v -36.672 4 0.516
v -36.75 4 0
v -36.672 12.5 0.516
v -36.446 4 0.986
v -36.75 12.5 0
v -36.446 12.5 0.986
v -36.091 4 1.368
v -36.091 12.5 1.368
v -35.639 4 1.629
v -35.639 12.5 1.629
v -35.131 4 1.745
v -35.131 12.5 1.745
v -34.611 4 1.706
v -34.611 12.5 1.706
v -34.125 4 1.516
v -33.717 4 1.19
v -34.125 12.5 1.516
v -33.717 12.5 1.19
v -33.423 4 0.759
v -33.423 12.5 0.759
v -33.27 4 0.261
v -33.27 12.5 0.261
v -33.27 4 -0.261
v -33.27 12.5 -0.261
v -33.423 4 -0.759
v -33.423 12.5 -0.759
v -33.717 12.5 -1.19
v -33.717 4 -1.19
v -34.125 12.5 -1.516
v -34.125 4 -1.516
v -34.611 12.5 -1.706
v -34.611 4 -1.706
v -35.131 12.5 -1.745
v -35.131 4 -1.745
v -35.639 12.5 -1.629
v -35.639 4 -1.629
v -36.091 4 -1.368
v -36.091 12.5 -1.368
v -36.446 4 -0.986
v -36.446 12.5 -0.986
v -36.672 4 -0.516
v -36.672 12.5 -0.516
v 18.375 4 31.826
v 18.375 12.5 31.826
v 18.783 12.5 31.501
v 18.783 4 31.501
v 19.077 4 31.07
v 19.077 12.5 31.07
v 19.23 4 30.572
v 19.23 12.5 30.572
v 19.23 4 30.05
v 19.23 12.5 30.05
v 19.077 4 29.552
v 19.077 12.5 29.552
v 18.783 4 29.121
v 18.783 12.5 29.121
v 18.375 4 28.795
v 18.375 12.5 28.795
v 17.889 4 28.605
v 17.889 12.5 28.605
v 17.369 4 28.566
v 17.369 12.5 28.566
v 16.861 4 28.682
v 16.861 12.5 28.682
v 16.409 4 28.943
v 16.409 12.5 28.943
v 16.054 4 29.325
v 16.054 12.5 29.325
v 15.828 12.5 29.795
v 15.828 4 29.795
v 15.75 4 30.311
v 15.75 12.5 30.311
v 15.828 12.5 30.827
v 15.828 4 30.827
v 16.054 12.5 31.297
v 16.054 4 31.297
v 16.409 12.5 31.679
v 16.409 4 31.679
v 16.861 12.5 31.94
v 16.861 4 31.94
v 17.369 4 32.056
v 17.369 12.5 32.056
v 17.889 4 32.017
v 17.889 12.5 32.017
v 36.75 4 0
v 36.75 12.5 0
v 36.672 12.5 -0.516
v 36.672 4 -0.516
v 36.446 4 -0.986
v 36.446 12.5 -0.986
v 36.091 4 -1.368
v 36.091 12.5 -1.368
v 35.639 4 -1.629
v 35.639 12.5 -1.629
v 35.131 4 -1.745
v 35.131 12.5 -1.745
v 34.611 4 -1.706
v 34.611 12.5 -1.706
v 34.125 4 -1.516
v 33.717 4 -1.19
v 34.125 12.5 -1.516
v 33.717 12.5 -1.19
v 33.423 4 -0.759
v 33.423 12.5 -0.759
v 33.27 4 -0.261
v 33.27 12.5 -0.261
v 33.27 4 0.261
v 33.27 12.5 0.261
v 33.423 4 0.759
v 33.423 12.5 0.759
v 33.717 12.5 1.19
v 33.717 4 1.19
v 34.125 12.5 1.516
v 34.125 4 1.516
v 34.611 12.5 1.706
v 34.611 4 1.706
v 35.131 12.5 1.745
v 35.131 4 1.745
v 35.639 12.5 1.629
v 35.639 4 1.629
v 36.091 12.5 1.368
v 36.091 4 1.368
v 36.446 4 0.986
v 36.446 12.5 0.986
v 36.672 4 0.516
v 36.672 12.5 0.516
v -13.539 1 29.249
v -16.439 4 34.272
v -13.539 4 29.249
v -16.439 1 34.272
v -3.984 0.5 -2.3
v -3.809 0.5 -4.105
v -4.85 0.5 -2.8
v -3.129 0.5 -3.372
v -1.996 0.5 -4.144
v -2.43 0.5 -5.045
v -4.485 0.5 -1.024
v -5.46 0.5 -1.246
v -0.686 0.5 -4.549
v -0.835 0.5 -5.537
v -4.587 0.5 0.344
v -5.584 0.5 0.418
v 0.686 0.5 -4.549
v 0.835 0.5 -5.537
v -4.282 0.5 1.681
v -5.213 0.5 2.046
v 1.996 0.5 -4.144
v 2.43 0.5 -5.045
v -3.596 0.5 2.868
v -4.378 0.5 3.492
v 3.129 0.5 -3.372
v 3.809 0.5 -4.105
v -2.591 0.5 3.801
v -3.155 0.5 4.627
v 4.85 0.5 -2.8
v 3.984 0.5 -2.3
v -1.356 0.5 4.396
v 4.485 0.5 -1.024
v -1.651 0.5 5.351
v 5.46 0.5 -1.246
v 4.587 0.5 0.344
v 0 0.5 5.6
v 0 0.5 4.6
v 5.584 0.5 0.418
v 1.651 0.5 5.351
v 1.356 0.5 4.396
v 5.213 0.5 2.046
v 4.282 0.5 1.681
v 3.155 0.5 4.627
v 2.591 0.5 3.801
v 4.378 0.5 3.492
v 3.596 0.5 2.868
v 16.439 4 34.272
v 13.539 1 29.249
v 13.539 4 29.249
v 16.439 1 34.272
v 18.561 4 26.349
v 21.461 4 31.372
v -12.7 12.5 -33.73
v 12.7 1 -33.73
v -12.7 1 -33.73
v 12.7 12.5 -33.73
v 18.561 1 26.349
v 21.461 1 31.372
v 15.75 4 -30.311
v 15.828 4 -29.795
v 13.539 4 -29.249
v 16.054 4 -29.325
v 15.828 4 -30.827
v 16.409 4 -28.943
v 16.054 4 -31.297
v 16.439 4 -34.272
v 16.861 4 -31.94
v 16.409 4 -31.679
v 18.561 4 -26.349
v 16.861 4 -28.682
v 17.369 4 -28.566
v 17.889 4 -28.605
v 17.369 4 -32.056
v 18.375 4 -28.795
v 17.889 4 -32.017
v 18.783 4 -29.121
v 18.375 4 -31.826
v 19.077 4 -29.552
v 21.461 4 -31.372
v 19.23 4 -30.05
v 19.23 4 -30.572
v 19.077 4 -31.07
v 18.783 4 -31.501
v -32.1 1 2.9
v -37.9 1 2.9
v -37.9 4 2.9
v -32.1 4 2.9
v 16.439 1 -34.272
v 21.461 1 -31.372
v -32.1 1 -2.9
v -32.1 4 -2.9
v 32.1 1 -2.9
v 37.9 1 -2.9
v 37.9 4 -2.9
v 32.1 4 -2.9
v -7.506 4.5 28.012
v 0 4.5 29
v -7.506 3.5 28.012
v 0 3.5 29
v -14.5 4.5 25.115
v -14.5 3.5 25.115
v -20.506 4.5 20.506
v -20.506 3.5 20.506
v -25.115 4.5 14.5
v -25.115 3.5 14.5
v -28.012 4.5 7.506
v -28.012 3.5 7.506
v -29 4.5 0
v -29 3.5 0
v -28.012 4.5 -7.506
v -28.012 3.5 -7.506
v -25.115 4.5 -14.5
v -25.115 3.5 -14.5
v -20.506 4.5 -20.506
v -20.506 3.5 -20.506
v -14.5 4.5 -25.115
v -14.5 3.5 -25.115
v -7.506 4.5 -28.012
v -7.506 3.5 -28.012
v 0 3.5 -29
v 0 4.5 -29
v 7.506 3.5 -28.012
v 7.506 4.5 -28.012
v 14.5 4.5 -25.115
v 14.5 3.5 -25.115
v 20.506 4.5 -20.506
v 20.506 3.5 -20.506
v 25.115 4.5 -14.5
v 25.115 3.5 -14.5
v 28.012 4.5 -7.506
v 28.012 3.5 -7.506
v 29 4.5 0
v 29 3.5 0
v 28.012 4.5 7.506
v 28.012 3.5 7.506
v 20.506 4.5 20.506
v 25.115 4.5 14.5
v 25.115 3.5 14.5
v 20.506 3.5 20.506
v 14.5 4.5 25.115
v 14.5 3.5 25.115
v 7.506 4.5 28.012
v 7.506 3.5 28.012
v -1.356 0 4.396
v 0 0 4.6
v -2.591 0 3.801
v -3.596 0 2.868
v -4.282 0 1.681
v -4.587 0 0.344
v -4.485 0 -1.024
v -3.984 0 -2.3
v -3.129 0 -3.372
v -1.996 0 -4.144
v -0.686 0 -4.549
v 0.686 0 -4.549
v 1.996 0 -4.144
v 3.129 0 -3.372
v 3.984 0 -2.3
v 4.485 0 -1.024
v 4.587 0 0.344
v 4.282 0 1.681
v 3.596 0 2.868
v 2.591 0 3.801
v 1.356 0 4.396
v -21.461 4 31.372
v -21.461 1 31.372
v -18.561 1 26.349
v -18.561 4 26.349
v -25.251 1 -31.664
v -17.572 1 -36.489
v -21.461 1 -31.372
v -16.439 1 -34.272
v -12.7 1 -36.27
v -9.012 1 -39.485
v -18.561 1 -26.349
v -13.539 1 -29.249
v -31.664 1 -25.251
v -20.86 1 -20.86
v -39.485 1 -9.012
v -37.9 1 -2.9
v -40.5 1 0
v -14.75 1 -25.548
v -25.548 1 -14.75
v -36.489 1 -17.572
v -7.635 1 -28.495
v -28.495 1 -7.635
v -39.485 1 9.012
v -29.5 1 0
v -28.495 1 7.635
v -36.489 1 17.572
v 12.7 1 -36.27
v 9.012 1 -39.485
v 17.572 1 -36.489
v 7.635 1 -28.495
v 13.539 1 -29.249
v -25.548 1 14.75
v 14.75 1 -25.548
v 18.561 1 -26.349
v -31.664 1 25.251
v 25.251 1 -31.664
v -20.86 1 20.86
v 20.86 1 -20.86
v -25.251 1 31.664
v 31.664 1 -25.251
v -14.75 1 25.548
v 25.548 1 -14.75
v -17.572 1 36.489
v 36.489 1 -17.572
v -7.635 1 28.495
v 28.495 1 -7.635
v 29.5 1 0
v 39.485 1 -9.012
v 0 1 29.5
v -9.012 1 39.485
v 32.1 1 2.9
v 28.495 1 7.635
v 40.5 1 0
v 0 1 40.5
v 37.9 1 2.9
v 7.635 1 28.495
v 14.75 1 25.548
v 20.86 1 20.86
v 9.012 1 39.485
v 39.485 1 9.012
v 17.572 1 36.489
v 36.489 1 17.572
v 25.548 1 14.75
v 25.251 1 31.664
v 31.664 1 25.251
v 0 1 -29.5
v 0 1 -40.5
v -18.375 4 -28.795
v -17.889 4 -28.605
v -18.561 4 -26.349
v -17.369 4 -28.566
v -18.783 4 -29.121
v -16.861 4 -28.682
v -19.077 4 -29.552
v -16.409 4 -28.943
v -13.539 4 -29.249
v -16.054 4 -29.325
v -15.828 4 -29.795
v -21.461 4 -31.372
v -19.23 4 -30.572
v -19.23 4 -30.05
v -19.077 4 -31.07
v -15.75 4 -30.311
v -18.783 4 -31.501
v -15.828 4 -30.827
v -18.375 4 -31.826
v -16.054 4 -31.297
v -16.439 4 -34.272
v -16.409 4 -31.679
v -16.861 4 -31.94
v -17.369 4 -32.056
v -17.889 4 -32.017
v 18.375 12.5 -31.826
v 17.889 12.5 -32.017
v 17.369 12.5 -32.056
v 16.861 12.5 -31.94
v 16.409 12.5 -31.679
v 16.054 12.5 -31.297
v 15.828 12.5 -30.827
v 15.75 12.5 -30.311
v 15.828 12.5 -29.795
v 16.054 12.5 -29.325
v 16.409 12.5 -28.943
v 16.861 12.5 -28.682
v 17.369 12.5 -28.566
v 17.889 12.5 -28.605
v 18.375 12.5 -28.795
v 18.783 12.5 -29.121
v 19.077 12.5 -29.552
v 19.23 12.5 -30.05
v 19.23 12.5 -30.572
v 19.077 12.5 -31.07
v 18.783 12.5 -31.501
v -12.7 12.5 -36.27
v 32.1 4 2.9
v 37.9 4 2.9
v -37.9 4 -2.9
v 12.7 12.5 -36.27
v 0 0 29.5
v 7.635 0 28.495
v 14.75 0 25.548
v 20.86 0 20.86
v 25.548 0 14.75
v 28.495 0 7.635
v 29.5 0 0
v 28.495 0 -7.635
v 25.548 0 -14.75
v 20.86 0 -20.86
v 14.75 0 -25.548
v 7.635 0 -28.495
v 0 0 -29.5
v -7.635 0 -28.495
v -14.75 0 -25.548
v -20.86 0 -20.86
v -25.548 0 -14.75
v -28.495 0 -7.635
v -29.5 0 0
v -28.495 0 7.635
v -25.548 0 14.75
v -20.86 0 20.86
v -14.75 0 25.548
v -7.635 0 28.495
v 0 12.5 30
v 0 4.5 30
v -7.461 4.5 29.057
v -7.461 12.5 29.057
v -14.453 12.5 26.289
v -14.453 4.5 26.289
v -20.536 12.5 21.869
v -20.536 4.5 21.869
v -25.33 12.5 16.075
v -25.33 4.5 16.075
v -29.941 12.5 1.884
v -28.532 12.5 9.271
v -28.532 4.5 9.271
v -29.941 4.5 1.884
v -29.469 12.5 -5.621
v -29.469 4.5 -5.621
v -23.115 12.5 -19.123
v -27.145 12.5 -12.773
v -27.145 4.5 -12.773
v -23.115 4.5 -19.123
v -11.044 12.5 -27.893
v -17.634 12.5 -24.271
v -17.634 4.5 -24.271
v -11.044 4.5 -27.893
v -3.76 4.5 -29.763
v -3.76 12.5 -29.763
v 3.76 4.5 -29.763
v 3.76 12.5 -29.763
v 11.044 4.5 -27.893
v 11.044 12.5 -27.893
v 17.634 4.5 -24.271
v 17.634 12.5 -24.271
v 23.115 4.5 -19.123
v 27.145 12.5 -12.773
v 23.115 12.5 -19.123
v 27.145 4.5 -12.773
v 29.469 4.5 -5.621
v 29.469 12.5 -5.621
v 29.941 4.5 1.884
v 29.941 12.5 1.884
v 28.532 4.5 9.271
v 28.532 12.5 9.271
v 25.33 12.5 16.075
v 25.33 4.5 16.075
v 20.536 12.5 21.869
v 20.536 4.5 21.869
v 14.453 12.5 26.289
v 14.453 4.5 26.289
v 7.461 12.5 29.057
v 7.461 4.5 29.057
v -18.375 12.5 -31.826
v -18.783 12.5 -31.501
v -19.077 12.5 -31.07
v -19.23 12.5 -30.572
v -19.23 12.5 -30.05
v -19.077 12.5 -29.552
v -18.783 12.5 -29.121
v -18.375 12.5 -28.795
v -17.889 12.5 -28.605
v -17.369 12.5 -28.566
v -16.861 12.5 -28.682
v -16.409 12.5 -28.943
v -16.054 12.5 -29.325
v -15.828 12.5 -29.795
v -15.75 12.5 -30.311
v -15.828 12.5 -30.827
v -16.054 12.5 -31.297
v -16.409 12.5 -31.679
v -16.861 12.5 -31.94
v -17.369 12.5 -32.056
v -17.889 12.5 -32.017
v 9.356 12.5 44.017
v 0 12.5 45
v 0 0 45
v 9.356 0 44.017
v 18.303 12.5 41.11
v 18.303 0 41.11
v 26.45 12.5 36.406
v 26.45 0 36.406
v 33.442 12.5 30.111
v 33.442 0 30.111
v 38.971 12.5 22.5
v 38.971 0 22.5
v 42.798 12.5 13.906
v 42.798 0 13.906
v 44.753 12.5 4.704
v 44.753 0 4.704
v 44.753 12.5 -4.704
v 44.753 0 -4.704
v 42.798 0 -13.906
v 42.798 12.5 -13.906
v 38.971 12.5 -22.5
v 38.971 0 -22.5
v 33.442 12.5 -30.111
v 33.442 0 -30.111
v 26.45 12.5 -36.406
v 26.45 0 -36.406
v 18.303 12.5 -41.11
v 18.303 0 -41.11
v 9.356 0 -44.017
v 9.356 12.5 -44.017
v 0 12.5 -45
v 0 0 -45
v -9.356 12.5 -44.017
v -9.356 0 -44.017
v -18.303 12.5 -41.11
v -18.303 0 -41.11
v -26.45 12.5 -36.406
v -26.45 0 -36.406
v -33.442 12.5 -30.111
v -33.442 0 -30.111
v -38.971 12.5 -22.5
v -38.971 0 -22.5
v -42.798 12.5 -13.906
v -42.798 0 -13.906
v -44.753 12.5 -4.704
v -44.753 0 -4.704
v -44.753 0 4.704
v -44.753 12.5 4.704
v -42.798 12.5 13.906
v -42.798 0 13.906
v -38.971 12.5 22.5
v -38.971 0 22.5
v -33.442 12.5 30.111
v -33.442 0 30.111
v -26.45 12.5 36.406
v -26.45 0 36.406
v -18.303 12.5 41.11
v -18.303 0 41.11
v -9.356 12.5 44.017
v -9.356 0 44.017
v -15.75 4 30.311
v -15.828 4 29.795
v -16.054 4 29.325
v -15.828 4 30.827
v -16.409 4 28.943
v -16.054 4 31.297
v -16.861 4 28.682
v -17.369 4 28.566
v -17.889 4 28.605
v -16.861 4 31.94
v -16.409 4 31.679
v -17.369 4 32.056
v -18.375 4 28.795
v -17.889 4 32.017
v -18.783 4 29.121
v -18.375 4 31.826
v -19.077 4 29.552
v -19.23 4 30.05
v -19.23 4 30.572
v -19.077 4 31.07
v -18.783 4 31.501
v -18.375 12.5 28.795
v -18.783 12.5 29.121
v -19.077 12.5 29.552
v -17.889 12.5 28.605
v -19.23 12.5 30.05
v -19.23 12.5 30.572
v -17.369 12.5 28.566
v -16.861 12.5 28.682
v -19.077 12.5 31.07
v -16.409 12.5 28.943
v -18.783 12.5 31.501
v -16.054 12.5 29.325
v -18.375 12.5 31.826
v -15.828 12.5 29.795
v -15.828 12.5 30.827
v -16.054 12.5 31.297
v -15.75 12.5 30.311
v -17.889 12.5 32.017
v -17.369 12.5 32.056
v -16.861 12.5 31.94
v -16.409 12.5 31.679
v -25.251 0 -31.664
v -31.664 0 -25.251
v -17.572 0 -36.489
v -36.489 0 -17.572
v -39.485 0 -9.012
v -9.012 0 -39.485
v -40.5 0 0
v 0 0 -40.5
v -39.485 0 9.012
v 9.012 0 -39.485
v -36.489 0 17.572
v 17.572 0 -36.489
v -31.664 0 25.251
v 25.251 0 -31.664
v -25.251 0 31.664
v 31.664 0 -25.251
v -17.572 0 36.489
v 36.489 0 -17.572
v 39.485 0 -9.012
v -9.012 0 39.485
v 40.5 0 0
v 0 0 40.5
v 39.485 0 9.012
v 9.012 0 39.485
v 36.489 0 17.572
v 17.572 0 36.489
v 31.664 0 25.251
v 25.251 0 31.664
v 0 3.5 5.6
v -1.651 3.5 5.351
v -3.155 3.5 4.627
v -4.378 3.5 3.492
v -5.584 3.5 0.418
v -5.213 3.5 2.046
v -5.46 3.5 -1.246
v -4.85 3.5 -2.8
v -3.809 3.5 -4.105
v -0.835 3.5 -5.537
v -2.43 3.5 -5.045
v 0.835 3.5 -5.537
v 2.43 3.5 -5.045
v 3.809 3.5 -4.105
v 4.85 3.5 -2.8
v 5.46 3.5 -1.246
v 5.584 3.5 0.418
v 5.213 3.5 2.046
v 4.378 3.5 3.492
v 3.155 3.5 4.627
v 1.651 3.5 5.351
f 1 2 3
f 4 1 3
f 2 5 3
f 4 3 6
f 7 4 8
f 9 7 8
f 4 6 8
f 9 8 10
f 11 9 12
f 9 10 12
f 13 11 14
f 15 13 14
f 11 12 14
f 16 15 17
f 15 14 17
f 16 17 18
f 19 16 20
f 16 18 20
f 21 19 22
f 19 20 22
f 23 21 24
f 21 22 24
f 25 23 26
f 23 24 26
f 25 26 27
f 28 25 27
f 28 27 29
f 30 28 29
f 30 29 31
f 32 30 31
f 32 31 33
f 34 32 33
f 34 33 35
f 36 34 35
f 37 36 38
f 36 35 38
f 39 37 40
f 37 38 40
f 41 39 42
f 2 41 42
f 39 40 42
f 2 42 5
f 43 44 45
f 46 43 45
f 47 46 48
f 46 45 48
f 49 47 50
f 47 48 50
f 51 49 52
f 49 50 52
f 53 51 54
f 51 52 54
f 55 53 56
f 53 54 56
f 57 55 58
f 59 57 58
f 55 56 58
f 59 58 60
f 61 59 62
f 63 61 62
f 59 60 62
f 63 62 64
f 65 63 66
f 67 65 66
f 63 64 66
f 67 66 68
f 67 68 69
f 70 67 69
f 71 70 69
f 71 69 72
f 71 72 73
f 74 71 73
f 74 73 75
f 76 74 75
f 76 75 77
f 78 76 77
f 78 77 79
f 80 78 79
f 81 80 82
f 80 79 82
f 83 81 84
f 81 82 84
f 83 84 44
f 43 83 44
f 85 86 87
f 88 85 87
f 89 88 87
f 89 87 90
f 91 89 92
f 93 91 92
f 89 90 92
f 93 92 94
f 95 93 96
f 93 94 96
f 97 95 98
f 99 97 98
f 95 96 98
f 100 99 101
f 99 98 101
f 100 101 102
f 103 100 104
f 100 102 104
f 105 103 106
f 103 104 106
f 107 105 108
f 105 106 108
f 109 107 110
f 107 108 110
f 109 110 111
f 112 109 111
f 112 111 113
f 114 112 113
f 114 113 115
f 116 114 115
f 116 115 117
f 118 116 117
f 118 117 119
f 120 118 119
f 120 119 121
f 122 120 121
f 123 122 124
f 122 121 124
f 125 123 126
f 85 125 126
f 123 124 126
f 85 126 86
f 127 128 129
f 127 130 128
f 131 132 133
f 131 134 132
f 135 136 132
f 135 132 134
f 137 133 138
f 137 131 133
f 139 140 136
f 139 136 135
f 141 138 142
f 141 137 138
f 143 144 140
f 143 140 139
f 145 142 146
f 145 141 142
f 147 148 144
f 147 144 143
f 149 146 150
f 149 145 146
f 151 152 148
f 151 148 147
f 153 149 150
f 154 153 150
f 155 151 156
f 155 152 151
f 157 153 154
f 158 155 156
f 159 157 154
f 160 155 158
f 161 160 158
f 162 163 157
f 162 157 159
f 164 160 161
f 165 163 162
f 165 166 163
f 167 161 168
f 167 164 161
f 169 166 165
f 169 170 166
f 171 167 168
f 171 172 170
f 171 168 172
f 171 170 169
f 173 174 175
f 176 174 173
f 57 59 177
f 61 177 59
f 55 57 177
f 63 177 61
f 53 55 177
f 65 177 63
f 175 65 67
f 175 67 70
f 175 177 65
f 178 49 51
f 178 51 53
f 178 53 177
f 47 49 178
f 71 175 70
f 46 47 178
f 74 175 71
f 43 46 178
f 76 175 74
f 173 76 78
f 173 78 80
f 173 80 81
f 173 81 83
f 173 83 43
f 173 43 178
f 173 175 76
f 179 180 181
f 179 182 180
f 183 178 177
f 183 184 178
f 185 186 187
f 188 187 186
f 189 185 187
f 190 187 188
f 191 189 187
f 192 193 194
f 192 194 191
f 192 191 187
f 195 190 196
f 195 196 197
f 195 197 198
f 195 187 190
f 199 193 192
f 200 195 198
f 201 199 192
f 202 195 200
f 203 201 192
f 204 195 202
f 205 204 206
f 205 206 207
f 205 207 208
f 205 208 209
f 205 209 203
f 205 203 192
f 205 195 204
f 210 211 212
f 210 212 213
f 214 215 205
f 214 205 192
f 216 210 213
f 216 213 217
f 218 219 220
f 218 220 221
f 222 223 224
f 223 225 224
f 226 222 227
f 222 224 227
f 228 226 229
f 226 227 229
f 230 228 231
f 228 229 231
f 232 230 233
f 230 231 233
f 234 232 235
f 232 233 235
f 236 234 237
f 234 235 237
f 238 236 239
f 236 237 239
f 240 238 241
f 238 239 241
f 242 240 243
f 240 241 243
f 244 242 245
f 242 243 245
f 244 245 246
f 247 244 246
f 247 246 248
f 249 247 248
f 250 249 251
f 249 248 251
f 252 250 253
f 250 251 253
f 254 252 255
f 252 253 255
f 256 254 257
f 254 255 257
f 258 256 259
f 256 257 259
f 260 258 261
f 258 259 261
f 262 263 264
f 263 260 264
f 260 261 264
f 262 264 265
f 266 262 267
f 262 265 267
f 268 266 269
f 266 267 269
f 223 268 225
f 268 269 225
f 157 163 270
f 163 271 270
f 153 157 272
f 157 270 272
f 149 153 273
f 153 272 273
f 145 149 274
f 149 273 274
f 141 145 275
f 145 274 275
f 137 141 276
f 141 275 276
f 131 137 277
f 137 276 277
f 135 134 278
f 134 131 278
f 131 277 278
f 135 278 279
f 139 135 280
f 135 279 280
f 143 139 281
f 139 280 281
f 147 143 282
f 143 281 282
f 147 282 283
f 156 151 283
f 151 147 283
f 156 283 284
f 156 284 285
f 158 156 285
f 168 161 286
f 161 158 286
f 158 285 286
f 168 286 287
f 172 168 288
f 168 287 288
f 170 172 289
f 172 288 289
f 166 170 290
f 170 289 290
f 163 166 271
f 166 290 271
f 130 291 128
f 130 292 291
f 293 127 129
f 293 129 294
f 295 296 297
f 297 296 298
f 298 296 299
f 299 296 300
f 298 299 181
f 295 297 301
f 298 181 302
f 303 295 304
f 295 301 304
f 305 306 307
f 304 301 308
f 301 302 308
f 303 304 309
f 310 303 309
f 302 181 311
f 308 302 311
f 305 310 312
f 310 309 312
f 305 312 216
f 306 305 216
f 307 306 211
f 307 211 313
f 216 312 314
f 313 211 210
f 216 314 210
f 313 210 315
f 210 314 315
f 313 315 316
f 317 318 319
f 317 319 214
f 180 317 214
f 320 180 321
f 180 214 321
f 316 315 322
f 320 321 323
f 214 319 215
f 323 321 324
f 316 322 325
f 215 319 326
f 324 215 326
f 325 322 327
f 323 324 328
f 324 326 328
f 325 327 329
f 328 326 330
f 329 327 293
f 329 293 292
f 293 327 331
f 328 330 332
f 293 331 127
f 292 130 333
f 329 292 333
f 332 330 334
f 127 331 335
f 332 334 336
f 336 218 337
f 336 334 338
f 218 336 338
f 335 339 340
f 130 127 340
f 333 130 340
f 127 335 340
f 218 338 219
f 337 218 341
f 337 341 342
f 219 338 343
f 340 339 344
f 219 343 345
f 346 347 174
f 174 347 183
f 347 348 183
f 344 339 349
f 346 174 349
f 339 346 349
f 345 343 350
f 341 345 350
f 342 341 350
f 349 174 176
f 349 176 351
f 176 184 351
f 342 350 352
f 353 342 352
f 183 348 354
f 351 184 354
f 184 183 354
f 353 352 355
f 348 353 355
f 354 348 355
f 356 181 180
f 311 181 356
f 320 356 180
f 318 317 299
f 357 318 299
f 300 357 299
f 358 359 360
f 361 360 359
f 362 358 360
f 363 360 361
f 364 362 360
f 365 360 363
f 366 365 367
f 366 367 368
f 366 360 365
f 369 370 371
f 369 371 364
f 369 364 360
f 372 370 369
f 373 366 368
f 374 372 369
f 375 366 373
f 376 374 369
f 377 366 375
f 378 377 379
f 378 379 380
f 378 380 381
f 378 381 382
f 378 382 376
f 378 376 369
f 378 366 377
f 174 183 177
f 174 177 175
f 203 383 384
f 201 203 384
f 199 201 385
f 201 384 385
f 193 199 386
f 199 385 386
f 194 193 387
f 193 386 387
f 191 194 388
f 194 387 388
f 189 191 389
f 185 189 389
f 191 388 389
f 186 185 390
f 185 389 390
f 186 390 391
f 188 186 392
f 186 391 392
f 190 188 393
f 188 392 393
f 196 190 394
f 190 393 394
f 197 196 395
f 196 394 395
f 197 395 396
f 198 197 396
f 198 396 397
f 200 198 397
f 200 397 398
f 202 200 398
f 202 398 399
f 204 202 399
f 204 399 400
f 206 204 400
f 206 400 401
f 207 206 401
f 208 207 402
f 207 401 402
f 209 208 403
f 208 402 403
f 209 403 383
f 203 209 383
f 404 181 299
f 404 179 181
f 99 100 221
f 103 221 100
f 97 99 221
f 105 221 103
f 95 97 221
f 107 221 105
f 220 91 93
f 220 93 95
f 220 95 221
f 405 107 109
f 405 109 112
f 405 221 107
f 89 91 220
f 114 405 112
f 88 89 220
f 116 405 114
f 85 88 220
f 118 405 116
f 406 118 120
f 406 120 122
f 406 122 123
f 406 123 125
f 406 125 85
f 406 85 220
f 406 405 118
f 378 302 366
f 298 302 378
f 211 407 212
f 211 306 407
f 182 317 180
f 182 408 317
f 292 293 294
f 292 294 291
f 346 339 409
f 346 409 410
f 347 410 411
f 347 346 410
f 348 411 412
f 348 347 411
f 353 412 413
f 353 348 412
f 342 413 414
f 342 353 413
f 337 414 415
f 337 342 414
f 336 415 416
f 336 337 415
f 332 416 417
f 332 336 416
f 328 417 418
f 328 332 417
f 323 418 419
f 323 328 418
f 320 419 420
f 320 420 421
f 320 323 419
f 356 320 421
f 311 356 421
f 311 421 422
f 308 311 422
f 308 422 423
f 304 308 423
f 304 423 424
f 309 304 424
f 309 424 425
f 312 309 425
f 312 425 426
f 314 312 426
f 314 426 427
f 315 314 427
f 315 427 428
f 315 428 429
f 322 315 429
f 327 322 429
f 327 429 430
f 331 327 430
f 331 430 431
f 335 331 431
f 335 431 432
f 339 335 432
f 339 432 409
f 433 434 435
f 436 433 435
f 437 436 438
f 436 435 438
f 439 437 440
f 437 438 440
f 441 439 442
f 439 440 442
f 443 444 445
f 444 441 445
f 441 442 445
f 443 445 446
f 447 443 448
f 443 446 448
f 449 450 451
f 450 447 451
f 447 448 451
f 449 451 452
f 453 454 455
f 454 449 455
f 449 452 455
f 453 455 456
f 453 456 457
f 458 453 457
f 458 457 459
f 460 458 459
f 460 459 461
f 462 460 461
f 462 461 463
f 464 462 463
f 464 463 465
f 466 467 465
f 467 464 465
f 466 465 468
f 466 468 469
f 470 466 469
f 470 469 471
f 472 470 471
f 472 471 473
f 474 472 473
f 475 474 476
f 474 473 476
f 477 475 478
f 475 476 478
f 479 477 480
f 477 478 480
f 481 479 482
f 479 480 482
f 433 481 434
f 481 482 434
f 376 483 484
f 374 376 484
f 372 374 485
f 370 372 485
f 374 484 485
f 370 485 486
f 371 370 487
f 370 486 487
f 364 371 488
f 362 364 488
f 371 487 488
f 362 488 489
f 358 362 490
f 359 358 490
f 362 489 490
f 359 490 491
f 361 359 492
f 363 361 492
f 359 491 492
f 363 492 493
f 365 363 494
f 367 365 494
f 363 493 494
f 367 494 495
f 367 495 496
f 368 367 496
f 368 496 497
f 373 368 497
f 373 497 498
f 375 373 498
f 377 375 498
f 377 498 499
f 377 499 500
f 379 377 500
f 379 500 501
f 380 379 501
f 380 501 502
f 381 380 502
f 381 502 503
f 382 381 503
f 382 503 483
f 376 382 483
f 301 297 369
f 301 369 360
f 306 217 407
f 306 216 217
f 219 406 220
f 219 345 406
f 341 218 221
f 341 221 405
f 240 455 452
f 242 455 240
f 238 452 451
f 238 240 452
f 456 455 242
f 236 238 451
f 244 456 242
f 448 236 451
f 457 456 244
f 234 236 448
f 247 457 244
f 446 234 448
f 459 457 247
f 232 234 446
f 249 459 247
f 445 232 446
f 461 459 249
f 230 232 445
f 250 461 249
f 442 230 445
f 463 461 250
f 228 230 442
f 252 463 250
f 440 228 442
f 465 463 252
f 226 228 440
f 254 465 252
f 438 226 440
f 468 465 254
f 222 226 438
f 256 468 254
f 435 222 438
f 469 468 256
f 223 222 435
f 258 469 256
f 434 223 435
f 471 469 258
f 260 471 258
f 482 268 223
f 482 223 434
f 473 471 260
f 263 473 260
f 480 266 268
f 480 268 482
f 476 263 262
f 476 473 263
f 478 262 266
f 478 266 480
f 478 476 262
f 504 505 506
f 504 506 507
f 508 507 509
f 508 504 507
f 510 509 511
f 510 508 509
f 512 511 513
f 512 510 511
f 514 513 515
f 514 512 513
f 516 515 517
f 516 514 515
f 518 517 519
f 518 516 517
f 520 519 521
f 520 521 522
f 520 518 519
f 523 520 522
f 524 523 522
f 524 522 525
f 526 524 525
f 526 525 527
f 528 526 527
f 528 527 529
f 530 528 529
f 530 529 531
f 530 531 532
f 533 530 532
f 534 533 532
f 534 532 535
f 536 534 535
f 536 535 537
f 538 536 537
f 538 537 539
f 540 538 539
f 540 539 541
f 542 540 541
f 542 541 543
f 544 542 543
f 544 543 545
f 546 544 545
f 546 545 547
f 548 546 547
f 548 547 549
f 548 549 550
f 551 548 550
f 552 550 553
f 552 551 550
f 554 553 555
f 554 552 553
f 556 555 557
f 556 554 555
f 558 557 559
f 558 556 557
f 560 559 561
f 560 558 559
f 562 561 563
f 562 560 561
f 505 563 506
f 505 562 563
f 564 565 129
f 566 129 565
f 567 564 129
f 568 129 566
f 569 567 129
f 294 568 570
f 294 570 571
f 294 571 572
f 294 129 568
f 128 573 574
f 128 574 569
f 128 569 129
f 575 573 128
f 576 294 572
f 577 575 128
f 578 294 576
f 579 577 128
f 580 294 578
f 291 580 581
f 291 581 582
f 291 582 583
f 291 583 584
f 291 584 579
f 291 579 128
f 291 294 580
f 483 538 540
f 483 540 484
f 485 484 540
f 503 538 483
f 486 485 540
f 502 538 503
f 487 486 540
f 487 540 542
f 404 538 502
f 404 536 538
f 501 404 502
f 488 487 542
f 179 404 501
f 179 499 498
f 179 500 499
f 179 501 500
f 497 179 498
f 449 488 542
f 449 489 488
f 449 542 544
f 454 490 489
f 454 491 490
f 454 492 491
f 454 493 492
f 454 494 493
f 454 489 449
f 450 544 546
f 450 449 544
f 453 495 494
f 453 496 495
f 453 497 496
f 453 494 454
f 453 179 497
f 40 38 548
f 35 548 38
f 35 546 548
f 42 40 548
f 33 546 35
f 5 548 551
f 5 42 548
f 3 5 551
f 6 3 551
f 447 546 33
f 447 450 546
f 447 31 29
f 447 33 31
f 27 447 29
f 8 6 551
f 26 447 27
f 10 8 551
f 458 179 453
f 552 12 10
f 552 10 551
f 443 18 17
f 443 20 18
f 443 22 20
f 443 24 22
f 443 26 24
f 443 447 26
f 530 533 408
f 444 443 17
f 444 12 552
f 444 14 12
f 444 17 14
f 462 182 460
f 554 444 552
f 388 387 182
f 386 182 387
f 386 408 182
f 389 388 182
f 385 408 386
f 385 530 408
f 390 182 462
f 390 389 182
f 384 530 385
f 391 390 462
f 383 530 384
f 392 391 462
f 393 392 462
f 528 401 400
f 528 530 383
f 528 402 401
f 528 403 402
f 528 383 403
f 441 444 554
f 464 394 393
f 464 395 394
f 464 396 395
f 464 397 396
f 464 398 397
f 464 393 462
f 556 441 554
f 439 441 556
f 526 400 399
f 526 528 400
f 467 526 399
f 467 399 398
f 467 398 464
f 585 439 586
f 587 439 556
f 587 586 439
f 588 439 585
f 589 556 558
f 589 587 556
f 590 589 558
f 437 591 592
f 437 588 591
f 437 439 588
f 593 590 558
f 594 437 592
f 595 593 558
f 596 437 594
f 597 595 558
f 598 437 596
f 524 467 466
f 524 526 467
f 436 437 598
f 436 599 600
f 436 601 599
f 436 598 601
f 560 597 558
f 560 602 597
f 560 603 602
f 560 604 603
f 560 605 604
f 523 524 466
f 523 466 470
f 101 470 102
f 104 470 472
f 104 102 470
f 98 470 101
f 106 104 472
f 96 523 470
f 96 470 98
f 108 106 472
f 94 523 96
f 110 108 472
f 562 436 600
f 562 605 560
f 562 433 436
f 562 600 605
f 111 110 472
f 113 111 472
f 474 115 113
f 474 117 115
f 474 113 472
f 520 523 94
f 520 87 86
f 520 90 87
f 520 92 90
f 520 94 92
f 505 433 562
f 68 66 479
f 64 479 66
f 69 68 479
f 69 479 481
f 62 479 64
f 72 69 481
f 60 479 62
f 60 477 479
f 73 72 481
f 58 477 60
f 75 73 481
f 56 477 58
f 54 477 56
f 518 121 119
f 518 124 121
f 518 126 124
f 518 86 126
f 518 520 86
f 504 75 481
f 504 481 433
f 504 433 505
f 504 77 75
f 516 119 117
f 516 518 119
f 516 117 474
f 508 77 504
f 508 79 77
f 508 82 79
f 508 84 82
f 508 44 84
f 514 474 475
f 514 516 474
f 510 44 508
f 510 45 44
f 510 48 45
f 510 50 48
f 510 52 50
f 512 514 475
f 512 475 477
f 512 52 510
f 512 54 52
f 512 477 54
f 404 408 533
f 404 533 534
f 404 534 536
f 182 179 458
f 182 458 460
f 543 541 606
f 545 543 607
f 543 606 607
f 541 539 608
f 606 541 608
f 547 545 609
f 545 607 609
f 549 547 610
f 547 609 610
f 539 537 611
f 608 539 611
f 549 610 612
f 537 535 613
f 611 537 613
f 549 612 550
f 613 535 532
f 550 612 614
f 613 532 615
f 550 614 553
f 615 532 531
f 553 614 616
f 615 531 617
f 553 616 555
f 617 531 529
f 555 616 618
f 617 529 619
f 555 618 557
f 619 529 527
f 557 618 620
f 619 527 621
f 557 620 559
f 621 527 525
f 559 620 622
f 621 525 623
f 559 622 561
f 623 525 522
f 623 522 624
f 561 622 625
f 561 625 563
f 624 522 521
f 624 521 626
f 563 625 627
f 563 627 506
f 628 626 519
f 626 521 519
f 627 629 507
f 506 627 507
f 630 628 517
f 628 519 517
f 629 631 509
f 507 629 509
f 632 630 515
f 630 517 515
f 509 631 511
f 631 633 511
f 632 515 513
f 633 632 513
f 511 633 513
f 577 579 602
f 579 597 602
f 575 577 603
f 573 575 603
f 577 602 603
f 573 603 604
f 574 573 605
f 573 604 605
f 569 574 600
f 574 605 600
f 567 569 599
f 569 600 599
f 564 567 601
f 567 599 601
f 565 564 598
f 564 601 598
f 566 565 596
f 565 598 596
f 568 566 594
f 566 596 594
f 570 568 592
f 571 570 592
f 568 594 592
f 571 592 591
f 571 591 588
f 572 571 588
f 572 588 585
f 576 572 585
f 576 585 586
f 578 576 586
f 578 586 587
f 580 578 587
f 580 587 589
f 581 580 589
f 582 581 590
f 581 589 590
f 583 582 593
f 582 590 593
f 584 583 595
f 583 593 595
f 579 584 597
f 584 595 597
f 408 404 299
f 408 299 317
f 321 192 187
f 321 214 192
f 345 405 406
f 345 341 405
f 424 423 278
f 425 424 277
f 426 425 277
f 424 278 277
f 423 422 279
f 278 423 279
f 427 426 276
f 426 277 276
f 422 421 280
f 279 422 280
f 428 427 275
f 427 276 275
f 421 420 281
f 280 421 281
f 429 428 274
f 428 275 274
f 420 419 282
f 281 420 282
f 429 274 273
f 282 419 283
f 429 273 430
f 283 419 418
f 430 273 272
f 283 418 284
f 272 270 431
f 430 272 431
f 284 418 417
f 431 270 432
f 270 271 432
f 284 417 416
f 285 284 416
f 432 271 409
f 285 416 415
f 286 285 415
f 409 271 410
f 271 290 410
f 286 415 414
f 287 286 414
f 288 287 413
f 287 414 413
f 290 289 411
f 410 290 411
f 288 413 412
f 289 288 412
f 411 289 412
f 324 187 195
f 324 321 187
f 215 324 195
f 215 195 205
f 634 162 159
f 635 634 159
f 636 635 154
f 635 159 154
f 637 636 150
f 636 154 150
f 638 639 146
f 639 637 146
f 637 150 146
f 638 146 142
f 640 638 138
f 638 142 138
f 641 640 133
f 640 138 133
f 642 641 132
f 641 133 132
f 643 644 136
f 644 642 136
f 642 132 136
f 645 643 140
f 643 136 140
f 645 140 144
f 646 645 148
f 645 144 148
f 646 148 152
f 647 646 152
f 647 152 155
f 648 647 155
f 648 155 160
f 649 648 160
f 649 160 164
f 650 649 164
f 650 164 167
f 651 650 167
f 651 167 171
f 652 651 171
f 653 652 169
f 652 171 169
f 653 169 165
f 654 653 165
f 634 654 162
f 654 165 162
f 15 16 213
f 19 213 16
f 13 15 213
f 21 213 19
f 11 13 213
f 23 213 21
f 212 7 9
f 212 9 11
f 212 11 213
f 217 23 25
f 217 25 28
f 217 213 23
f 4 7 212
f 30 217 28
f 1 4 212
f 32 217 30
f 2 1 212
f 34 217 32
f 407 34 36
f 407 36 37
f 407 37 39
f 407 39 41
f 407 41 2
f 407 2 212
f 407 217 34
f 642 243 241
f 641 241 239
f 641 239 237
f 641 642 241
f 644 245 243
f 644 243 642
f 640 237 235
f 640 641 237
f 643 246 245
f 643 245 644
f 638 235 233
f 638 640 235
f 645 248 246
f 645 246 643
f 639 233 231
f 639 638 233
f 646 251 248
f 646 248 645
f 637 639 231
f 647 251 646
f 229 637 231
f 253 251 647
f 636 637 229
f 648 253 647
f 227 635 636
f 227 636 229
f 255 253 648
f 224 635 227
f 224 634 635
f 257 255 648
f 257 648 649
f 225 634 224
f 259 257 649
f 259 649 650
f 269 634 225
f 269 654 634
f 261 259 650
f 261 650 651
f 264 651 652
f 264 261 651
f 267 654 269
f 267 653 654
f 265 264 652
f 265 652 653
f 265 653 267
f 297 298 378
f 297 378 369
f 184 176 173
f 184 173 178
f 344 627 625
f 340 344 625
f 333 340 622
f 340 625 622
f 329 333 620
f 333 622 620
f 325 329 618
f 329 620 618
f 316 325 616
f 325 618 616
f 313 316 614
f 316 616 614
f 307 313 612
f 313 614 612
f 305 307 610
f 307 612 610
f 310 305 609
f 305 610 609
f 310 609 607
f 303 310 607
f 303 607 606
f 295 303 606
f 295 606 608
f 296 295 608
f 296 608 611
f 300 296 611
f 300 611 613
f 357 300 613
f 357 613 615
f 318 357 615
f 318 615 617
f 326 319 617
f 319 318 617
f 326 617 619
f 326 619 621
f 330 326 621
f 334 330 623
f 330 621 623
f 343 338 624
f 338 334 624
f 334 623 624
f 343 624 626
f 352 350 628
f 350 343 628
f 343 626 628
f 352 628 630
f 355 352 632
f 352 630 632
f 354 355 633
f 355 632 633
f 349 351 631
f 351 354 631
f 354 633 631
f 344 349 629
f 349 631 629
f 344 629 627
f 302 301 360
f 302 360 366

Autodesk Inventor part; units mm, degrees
ref_plane "YZ Plane" through (0, 0, 0) normal (1, 0, 0) x (0, 1, 0)
ref_plane "XZ Plane" through (0, 0, 0) normal (0, 1, 0) x (-1, 0, 0)
ref_plane "XY Plane" through (0, 0, 0) normal (0, 0, 1) x (1, 0, 0)
sketch "Sketch19" plane through (0, 0, 0) normal (1, 0, 0) x (0, 1, 0)
  line L0 (0, 0) -> (14.81, 0) construction
  line L1 (0, 0) -> (0, 4.6) construction
  line L2 (0, 29.5) -> (1, 29.5)
  line L3 (1, 29.5) -> (1, 40.5)
  line L4 (1, 40.5) -> (0, 40.5)
  line L5 (0, 40.5) -> (0, 45)
  line L6 (0, 45) -> (12.5, 45)
  line L7 (12.5, 45) -> (12.5, 30)
  line L8 (12.5, 30) -> (4.5, 30)
  line L9 (4.5, 30) -> (4.5, 29)
  line L10 (4.5, 29) -> (3.5, 29)
  line L11 (3.5, 29) -> (3.5, 5.6)
  line L12 (3.5, 5.6) -> (0.5, 5.6)
  line L13 (0.5, 5.6) -> (0.5, 4.6)
  line L14 (0.5, 4.6) -> (0, 4.6)
  line L15 (0, 4.6) -> (0, 29.5)
  dimension "d90" = 0.5
  dimension "d91" = 5.6
  dimension "d92" = 1
  dimension "d93" = 29.5
  dimension "d94" = 40.5
  dimension "d95" = 45
  dimension "d96" = 1
  dimension "d97" = 1
  dimension "d99" = 30
  dimension "d100" = 1
  dimension "d101" = 8
  dimension "d103" = 3
revolve "Revolution2" add sketch "Sketch19" angle 360 about axis through (0, 0, 0) along (0, 1, 0)
sketch "Sketch20" plane through (0, 12.5, 0) normal (0, 1, 0) x (1, 0, 0)
  circle A0 centre (0, 0) radius 35 construction
  circle A1 centre (35, 0) radius 1.75
  dimension "d104" = 70
  dimension "d105" = 3.5
extrude "Extrusion18" cut sketch "Sketch20" against normal through all
sketch "Sketch21" plane through (0, 1, 0) normal (0, -1, 0) x (1, 0, 0)
  line L0 (32.1, 2.9) -> (37.9, 2.9)
  line L1 (37.9, 2.9) -> (37.9, -2.9)
  line L2 (37.9, -2.9) -> (32.1, -2.9)
  line L3 (32.1, -2.9) -> (32.1, 2.9)
  circle A0 centre (35, 0) radius 1.75 projected
  line L4 (32.1, 2.9) -> (37.9, -2.9) construction
  line L5 (37.9, 2.9) -> (32.1, -2.9) construction
  point P0 (0, 0)
  dimension "d108" = 5.8
  dimension "d109" = 5.8
extrude "Extrusion19" cut sketch "Sketch21" against normal blind 3 contours L0 L1 L2 L3 | A0
pattern_circular "Circular Pattern3" count 6 over 360 about axis through (0, 6.25, 0) along (0, 1, 0) of "Extrusion19", "Extrusion18"
sketch "Sketch22" plane through (0, 12.5, 0) normal (0, 1, 0) x (1, 0, 0)
  line L0 (-12.7, 36.27) -> (12.7, 36.27)
  line L1 (12.7, 36.27) -> (12.7, 33.73)
  line L2 (12.7, 33.73) -> (-12.7, 33.73)
  line L3 (-12.7, 33.73) -> (-12.7, 36.27)
  line L4 (-12.7, 36.27) -> (12.7, 33.73) construction
  line L5 (12.7, 36.27) -> (-12.7, 33.73) construction
  line L6 (0, 35) -> (0, 0) construction
  dimension "d115" = 35
  dimension "d116" = 25.4
  dimension "d117" = 2.54
extrude "Extrusion20" cut sketch "Sketch22" against normal through all
properties part number "Wrist_planetary"
